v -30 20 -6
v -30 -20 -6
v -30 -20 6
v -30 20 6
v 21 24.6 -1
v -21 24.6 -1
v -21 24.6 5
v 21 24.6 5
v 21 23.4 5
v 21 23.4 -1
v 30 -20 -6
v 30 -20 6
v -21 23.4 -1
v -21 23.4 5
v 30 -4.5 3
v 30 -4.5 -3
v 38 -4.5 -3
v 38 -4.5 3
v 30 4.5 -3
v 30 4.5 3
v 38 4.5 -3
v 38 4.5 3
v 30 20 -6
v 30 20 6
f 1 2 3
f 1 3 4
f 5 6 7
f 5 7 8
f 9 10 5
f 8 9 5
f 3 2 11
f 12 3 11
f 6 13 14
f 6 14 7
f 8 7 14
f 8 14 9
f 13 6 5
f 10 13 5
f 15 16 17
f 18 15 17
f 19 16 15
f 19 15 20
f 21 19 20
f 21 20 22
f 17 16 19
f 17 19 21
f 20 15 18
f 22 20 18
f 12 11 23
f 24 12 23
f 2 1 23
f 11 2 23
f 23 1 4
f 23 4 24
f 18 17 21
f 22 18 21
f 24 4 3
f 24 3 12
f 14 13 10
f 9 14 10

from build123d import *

# Parameters (mm, degrees)
F_5V_START                                  = -6
SKETCH_1_W                                  = 60
SKETCH_1_H                                  = 40
F_5V_BATTERY_POWER_BANK_ENVELOPE_60_X_DEPTH = 12
USB_START                                   = -3
SKETCH_2_W                                  = 8
SKETCH_2_H                                  = 9
USB_POWER_CABLE_CLEARANCE_MARKER_DEPTH      = 6
POWER_START                                 = -1
SKETCH_3_W                                  = 42
SKETCH_3_H                                  = 1.2
POWER_LABEL_PLATE_5V_POWER_DEPTH            = 6


with BuildPart() as part:
    # 草图1 → 5V battery / power bank envelope - 60 x 40 x 12 mm (new body)
    with BuildSketch(Plane.XY.offset(F_5V_START)):
        Rectangle(SKETCH_1_W, SKETCH_1_H)
    extrude(amount=F_5V_BATTERY_POWER_BANK_ENVELOPE_60_X_DEPTH)


with BuildPart() as body_2:
    # 草图2 → USB power cable clearance marker (new body)
    with BuildSketch(Plane.XY.offset(USB_START)):
        with Locations((34, 0)):
            Rectangle(SKETCH_2_W, SKETCH_2_H)
    extrude(amount=USB_POWER_CABLE_CLEARANCE_MARKER_DEPTH)


with BuildPart() as body_3:
    # 草图3 → power label plate - 5V POWER (new body)
    with BuildSketch(Plane.XY.offset(POWER_START)):
        with Locations((0, 24)):
            Rectangle(SKETCH_3_W, SKETCH_3_H)
    extrude(amount=POWER_LABEL_PLATE_5V_POWER_DEPTH)


solid = Compound([part.part, body_2.part, body_3.part])
